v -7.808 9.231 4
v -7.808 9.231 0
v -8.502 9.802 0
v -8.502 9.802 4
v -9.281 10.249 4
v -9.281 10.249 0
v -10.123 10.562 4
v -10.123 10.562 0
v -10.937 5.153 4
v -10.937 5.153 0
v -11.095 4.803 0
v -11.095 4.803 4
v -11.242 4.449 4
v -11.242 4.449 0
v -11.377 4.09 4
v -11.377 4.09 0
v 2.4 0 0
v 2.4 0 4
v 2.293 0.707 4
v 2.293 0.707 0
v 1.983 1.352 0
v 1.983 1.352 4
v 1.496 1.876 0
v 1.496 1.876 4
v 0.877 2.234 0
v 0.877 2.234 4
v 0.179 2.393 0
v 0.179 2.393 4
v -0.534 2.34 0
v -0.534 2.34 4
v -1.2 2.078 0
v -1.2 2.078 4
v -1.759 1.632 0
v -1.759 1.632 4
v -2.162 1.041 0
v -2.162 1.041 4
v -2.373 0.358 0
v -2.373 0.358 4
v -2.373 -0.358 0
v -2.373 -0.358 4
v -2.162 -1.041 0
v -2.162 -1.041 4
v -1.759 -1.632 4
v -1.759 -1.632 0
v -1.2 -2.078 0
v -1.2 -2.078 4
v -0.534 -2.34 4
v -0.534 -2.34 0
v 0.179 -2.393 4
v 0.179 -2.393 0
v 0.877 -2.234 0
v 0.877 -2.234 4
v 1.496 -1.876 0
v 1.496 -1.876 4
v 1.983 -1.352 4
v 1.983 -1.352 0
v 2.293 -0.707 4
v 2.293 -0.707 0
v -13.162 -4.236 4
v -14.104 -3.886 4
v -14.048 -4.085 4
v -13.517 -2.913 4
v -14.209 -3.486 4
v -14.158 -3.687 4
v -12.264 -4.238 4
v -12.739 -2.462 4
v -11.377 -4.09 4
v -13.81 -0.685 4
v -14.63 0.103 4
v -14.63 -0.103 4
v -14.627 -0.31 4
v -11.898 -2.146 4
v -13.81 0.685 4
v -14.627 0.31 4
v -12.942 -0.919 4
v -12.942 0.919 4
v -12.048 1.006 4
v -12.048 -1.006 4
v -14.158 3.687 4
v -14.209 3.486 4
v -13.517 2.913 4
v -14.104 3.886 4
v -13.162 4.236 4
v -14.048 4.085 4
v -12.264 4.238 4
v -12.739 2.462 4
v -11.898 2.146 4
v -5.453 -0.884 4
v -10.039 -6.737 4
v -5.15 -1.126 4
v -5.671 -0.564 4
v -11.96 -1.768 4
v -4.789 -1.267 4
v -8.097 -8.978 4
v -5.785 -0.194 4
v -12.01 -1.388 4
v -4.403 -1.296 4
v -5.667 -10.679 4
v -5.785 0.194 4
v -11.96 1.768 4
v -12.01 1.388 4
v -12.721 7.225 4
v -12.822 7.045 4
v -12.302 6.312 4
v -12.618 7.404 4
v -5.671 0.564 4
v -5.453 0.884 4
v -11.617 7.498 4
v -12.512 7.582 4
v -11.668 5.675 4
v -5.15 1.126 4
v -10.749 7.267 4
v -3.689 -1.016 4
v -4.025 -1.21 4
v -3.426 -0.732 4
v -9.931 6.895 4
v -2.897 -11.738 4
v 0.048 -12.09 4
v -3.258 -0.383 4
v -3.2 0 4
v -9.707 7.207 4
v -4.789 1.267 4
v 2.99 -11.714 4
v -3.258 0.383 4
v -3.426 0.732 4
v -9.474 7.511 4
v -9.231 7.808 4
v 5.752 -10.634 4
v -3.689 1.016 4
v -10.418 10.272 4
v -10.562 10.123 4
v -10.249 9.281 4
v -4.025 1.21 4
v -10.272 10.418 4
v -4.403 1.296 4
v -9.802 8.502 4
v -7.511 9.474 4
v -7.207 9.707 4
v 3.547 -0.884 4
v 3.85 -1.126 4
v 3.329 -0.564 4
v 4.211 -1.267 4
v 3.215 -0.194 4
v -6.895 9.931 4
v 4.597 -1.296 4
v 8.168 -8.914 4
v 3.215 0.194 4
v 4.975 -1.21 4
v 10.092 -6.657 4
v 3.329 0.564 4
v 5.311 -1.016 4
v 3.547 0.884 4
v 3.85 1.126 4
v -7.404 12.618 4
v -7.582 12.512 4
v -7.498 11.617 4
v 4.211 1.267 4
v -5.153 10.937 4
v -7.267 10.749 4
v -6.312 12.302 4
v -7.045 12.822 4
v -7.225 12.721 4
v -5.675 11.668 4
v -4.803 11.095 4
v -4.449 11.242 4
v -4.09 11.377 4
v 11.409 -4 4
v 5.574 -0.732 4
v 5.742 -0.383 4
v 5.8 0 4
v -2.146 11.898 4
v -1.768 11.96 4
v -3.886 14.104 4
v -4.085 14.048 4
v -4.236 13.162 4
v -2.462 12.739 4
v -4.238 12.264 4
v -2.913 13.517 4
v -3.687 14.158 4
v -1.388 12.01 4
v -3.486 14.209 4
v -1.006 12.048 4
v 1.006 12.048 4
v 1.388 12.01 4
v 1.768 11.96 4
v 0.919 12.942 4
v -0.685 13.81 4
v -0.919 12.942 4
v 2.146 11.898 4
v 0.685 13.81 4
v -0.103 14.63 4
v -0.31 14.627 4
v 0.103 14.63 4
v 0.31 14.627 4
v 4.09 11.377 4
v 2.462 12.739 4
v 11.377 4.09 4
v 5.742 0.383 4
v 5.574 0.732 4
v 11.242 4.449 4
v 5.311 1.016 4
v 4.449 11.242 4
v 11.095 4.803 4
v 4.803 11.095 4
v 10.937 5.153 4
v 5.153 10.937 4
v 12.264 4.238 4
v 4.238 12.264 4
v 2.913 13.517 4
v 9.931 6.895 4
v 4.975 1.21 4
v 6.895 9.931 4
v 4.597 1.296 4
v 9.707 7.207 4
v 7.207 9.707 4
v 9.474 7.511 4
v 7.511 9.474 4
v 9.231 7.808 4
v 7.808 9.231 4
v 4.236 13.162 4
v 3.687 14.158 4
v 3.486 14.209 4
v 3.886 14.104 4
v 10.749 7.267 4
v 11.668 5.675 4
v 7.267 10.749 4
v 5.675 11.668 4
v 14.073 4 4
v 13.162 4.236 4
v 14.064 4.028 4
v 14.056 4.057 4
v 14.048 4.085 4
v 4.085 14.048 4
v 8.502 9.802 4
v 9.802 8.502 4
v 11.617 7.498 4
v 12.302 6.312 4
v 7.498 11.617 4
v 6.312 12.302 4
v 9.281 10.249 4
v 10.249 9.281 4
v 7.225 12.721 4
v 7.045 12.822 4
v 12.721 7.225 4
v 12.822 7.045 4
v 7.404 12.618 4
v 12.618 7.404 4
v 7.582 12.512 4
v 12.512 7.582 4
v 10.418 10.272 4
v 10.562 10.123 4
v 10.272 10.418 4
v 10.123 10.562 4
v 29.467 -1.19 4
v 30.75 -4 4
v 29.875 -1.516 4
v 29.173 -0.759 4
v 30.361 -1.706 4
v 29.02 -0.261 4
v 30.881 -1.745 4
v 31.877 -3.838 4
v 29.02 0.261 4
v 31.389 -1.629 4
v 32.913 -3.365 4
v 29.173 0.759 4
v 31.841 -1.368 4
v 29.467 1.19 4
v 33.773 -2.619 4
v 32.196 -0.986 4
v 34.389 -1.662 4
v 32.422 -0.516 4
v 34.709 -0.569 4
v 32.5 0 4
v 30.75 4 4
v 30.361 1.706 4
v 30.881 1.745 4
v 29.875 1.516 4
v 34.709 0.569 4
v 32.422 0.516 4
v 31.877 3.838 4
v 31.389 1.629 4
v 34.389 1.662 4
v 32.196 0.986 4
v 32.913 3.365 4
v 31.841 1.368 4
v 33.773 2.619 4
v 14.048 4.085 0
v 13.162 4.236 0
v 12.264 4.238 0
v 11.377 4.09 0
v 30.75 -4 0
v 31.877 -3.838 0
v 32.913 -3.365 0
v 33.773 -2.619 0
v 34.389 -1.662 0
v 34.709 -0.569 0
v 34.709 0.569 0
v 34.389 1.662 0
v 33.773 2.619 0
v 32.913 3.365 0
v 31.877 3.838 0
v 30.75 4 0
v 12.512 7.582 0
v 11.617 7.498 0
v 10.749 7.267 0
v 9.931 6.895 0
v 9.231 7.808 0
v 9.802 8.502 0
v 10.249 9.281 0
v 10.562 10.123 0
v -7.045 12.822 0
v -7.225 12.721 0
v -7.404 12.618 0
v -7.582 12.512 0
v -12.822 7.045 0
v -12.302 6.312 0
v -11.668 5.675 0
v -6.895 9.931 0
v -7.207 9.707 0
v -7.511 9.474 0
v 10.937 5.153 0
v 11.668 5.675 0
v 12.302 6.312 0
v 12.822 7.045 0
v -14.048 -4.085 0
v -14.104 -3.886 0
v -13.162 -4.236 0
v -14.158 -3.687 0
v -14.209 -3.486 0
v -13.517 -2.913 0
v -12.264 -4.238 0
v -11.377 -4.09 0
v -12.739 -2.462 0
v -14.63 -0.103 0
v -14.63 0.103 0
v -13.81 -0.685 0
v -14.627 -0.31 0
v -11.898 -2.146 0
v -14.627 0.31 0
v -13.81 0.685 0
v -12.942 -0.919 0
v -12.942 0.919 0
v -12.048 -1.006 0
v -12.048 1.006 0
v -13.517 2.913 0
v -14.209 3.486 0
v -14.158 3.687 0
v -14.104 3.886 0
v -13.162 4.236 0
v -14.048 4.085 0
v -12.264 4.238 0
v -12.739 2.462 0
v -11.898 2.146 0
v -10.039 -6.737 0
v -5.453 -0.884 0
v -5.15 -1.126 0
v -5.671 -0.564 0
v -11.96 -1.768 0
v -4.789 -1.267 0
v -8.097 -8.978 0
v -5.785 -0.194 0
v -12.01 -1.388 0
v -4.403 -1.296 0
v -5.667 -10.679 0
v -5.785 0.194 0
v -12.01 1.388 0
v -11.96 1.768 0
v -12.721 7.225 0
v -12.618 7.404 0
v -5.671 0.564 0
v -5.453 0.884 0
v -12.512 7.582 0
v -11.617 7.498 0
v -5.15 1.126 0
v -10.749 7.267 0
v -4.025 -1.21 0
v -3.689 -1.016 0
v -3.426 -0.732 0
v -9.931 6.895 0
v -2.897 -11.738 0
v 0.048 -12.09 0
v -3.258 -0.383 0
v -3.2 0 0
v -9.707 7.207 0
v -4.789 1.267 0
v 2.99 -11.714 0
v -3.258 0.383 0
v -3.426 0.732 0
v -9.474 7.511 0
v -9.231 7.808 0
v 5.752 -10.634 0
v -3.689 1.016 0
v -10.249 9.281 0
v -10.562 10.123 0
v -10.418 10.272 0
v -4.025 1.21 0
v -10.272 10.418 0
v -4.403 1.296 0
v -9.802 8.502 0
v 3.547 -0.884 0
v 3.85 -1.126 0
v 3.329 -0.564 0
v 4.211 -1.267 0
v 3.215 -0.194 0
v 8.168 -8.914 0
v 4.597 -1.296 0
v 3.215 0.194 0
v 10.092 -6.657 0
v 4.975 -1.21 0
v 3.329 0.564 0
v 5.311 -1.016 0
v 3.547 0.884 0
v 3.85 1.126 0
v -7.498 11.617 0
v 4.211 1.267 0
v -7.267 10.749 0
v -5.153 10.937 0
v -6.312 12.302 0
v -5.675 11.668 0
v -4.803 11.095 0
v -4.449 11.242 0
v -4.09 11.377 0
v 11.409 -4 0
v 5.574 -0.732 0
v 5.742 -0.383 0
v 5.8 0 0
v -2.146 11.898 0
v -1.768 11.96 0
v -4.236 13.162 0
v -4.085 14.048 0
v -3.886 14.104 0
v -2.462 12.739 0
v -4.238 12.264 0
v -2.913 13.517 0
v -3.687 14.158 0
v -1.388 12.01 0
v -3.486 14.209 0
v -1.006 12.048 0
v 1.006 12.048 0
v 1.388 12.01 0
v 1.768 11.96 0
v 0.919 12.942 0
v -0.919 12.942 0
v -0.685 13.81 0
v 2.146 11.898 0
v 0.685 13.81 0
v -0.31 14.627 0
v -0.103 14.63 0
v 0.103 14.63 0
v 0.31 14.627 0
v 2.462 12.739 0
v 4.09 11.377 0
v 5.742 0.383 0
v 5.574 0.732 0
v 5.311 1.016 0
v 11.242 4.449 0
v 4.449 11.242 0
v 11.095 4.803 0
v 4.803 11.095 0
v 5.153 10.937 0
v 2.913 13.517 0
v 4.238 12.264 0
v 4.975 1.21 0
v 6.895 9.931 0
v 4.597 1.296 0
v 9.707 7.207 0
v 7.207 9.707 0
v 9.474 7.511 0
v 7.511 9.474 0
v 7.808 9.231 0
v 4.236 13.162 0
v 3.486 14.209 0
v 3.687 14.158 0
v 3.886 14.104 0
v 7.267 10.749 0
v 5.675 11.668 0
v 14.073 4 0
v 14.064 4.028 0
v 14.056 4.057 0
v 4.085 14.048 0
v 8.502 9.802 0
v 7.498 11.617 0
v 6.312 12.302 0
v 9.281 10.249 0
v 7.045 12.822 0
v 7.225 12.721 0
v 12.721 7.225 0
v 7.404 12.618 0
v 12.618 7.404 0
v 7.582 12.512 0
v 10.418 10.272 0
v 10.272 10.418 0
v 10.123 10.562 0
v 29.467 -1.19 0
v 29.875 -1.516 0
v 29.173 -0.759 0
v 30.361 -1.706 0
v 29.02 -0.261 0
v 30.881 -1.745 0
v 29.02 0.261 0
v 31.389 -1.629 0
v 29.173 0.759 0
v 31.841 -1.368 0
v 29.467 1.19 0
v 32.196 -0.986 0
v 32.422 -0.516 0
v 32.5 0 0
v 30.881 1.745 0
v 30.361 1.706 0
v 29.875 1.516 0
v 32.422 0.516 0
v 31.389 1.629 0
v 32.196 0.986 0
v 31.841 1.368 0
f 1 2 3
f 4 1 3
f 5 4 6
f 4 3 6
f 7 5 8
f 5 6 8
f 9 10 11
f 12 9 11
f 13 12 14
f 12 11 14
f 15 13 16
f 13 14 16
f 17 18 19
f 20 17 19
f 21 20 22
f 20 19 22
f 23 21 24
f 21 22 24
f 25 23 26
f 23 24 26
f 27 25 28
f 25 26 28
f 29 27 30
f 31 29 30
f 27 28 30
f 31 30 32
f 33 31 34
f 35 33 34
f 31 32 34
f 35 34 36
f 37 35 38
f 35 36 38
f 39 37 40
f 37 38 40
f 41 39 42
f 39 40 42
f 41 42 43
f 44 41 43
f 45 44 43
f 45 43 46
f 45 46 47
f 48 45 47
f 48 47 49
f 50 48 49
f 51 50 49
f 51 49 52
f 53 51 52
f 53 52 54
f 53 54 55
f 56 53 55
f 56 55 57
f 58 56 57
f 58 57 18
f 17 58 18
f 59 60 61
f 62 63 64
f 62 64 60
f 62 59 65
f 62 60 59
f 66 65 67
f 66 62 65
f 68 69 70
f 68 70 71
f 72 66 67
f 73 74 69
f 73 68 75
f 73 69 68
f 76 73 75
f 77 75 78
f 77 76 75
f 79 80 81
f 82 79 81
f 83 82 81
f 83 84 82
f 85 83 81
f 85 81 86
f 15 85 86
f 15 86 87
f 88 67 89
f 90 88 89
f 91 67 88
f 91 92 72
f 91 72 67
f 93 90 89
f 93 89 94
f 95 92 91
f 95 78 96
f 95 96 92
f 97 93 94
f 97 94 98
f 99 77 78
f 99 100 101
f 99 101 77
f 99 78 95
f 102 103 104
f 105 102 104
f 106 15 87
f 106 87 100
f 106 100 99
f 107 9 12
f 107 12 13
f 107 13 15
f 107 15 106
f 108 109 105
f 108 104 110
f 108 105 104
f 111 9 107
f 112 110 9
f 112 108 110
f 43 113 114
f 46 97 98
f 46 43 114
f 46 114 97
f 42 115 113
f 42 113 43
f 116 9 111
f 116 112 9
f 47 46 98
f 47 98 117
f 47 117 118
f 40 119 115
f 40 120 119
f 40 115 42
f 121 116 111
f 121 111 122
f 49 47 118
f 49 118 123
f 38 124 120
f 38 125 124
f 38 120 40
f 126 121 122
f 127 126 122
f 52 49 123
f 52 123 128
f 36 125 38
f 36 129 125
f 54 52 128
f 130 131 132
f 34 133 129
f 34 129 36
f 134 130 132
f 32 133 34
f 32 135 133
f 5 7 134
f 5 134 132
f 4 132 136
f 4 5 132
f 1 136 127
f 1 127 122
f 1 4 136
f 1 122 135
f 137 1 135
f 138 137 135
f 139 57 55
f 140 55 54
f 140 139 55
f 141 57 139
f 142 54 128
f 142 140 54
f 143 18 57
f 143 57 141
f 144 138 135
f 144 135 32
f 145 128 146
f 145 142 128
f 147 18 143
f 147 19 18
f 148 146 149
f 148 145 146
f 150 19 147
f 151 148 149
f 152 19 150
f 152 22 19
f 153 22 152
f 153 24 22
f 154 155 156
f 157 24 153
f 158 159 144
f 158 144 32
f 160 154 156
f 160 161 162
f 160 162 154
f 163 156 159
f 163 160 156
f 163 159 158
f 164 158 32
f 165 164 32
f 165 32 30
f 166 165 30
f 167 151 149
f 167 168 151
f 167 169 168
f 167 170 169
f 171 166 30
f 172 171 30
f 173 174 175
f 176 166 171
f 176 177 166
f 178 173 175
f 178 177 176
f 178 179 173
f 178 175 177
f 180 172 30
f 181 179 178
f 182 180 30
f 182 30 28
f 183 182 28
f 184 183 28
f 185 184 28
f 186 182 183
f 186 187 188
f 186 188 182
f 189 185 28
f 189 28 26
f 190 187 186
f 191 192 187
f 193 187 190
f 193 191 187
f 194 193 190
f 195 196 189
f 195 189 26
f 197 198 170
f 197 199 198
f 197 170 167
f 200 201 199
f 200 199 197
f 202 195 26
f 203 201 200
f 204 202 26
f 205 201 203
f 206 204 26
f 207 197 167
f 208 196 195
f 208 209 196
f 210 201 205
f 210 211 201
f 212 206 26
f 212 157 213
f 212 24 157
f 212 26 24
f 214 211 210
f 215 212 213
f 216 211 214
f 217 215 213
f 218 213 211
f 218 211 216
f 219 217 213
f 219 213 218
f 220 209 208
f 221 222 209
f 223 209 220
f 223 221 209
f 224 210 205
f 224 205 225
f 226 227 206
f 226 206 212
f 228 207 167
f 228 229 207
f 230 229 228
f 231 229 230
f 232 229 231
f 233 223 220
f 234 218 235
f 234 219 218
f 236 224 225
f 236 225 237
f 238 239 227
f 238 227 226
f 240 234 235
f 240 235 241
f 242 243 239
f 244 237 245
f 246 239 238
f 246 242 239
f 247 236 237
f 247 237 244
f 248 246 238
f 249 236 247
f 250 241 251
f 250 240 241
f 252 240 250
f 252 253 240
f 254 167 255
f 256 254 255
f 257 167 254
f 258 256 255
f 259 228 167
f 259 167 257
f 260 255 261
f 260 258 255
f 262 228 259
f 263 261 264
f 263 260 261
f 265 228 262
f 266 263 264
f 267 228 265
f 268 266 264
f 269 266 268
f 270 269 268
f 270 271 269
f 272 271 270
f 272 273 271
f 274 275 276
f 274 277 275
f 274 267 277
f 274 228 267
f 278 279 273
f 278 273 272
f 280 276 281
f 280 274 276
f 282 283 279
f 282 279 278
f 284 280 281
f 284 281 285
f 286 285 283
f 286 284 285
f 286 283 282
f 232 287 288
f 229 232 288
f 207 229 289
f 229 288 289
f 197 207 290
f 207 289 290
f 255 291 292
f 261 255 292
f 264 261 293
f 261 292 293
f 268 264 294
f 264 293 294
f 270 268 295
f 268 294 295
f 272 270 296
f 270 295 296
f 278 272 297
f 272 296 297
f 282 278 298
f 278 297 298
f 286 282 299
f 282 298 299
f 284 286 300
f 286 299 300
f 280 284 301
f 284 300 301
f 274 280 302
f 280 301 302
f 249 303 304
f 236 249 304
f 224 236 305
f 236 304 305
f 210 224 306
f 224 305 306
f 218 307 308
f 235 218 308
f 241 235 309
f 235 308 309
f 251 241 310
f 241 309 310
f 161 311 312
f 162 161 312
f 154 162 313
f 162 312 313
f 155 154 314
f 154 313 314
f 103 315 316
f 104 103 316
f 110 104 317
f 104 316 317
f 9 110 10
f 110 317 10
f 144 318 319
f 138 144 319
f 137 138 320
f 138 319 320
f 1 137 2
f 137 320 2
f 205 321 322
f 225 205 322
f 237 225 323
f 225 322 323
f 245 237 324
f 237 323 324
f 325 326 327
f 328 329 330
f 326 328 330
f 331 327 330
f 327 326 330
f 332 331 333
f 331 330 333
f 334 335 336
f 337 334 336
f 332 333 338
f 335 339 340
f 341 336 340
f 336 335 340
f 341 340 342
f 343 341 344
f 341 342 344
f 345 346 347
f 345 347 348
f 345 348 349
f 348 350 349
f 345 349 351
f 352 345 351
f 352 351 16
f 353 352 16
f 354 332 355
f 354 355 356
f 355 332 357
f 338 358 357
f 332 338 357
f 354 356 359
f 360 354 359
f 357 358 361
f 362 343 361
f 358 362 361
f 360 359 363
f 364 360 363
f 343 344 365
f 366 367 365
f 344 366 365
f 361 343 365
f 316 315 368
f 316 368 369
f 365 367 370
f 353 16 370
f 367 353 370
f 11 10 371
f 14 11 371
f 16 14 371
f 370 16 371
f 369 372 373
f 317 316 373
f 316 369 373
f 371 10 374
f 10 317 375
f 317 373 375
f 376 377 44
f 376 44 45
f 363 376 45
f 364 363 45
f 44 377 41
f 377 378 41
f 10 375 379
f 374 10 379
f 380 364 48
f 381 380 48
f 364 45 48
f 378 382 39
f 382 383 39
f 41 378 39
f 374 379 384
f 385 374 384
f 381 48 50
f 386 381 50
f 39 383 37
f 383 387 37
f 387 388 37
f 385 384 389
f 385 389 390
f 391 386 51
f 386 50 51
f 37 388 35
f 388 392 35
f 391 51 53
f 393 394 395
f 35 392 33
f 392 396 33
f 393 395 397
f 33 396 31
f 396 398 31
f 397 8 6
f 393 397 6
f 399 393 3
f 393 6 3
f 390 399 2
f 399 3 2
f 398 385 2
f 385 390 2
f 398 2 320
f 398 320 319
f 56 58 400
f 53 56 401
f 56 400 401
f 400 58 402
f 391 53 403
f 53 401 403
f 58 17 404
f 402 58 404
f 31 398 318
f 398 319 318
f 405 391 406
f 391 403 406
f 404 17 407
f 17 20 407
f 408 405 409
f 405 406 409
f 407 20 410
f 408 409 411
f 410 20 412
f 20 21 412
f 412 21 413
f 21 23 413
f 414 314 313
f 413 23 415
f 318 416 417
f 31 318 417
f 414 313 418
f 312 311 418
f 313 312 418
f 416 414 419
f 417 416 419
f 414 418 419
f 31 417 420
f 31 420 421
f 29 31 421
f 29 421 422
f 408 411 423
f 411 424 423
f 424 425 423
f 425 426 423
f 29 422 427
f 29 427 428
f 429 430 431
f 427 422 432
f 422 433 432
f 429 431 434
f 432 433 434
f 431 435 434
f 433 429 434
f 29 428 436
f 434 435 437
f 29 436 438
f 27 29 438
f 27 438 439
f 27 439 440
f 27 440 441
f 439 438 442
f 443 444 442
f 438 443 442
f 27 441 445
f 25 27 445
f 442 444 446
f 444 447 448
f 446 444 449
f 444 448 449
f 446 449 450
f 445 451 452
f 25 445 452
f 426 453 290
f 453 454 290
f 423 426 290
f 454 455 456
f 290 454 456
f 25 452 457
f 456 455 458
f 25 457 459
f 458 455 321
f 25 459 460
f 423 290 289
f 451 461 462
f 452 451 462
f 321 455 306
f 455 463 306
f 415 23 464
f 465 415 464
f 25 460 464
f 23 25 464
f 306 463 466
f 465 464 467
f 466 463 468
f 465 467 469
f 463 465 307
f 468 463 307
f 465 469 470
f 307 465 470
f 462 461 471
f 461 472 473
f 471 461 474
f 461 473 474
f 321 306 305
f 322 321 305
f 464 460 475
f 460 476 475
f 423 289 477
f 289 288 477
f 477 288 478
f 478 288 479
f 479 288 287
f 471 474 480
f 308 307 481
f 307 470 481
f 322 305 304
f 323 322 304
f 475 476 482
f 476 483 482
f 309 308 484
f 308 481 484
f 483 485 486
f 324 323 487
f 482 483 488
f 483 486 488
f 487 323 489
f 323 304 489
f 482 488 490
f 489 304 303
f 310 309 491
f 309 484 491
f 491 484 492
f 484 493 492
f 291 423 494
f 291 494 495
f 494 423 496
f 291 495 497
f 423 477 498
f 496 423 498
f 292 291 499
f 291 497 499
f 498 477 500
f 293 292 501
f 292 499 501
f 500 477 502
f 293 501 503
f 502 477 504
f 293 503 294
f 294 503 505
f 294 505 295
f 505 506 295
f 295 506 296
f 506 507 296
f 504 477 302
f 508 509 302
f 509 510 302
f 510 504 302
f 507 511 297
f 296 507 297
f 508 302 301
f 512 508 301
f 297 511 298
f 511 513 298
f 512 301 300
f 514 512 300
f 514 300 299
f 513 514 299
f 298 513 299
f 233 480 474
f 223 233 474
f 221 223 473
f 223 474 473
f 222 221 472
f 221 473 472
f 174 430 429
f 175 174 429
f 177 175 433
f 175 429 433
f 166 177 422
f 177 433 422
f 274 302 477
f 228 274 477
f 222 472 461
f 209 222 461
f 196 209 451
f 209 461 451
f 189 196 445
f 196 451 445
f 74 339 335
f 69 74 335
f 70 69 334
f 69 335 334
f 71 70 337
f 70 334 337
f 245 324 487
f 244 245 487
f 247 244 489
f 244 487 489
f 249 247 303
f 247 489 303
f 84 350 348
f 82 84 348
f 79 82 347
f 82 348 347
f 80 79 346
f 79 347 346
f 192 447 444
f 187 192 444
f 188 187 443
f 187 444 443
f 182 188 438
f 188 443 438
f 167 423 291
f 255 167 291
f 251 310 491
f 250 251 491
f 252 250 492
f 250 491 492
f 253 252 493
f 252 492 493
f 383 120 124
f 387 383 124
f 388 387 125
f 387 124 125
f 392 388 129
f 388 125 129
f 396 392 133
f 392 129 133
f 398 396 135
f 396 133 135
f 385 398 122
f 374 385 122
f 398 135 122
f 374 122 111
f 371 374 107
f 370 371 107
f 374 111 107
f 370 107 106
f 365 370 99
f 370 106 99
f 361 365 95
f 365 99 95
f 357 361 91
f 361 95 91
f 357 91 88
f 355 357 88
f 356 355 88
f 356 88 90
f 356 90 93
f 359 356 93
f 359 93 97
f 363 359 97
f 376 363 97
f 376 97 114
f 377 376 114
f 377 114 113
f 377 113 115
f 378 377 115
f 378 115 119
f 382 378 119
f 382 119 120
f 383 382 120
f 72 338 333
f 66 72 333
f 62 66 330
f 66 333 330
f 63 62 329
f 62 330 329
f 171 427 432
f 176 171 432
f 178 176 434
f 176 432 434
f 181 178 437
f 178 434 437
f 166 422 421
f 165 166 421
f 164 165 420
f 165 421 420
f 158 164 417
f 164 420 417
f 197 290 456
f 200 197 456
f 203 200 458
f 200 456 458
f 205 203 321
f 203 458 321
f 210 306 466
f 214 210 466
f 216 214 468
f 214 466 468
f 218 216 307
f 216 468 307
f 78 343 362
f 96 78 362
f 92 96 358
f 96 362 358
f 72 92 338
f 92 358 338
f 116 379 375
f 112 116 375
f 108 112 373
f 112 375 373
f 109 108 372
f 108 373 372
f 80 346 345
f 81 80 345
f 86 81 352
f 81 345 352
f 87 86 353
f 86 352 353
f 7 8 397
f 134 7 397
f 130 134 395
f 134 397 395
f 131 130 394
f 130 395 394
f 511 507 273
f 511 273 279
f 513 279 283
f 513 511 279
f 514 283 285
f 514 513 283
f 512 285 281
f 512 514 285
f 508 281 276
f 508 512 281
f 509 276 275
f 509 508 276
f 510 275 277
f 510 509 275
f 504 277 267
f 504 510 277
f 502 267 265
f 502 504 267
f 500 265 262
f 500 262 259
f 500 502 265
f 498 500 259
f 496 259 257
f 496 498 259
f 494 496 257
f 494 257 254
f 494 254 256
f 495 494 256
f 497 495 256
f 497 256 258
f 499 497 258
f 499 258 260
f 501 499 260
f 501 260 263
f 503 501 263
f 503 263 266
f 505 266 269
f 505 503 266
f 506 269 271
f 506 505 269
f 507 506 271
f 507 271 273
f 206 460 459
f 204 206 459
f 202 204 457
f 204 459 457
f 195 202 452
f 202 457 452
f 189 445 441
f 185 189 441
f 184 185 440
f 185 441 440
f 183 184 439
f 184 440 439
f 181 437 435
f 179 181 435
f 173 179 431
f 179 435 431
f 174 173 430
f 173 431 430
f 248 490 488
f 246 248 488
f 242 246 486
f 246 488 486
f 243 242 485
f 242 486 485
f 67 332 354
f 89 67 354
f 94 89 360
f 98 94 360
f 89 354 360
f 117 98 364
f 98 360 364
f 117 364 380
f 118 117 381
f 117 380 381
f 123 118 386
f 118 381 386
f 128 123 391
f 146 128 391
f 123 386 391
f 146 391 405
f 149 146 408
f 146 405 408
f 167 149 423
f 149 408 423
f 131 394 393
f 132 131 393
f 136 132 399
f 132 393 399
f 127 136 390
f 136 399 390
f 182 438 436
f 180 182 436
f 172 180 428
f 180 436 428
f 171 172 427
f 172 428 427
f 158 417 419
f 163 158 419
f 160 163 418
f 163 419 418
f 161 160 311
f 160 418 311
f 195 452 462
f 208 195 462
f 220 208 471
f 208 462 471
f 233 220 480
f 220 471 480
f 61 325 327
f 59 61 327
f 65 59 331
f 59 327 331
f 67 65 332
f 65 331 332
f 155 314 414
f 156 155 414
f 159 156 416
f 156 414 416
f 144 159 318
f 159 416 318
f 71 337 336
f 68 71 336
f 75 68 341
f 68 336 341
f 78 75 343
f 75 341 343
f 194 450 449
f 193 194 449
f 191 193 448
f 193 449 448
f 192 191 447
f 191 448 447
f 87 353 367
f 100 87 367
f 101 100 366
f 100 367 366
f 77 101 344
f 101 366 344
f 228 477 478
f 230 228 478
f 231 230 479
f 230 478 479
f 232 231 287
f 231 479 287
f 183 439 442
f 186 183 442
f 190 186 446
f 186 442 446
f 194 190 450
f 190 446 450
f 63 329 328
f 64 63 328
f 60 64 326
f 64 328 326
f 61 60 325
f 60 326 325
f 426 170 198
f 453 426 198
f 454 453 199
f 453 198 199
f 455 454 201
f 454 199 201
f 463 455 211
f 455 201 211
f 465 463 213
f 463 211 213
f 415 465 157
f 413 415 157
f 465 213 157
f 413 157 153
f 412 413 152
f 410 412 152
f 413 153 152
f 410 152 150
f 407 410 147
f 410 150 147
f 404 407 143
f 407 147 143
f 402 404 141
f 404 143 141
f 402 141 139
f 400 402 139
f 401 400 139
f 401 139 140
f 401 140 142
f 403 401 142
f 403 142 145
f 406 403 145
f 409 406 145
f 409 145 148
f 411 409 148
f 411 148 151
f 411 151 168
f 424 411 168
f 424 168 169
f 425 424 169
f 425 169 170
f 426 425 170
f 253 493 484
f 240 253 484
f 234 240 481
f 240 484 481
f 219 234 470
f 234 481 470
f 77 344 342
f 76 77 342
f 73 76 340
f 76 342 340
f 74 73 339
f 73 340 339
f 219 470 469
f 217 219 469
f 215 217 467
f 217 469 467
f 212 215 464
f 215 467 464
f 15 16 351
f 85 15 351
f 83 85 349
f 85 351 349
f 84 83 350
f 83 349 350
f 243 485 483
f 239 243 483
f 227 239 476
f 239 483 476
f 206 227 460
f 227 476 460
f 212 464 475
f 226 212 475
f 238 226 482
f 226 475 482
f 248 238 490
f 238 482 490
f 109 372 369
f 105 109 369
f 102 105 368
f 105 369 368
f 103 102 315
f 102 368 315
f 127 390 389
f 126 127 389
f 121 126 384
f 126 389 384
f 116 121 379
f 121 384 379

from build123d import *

# Parameters (mm, degrees)
SKETCH1_R           = 1.75
BOSS_EXTRUDE1_DEPTH = 4
SKETCH2_R           = 1.3
SKETCH2_R_2         = 2.4
CUT_EXTRUDE1_DEPTH  = 38.915688046


with BuildPart() as part:
    # Sketch1 → Boss-Extrude1 (new body)
    with BuildSketch(Plane.XY):
        with BuildLine():
            ThreePointArc((30.75, -4), (34.75, 0), (30.75, 4))
            Line((30.75, 4), (14.072558403, 4))
            ThreePointArc((14.072558403, 4), (14.06038767, 4.04257326), (14.048088143, 4.085109489))
            ThreePointArc((14.048088143, 4.085109489), (12.712915648, 4.255390909), (11.377106712, 4.090176385))
            ThreePointArc((11.377106712, 4.090176385), (11.169703548, 4.626642697), (10.937020765, 5.152637848))
            ThreePointArc((10.937020765, 5.152637848), (11.998404632, 5.980373095), (12.82210701, 7.044889767))
            ThreePointArc((12.82210701, 7.044889767), (12.669951657, 7.315), (12.51210701, 7.581825517))
            ThreePointArc((12.51210701, 7.581825517), (11.17835734, 7.400736668), (9.930825655, 6.8954189))
            ThreePointArc((9.930825655, 6.8954189), (9.591641884, 7.359925677), (9.230750012, 7.807775241))
            ThreePointArc((9.230750012, 7.807775241), (10.041734454, 8.882012453), (10.561852666, 10.123446462))
            ThreePointArc((10.561852666, 10.123446462), (10.344972209, 10.344972209), (10.123446462, 10.561852666))
            ThreePointArc((10.123446462, 10.561852666), (8.882012453, 10.041734454), (7.807775241, 9.230750012))
            ThreePointArc((7.807775241, 9.230750012), (7.359925677, 9.591641884), (6.8954189, 9.930825655))
            ThreePointArc((6.8954189, 9.930825655), (7.400736668, 11.17835734), (7.581825517, 12.51210701))
            ThreePointArc((7.581825517, 12.51210701), (7.315, 12.669951657), (7.044889767, 12.82210701))
            ThreePointArc((7.044889767, 12.82210701), (5.980373095, 11.998404632), (5.152637848, 10.937020765))
            ThreePointArc((5.152637848, 10.937020765), (4.626642697, 11.169703548), (4.090176385, 11.377106712))
            ThreePointArc((4.090176385, 11.377106712), (4.255390909, 12.712915648), (4.085109489, 14.048088143))
            ThreePointArc((4.085109489, 14.048088143), (3.78652263, 14.131494839), (3.486235477, 14.208555951))
            ThreePointArc((3.486235477, 14.208555951), (2.671181194, 13.137403362), (2.1463567, 11.897951627))
            ThreePointArc((2.1463567, 11.897951627), (1.578061664, 11.986568374), (1.00619511, 12.048056748))
            ThreePointArc((1.00619511, 12.048056748), (0.820047291, 13.381109763), (0.31, 14.626715284))
            ThreePointArc((0.31, 14.626715284), (0, 14.63), (-0.31, 14.626715284))
            ThreePointArc((-0.31, 14.626715284), (-0.820047291, 13.381109763), (-1.00619511, 12.048056748))
            ThreePointArc((-1.00619511, 12.048056748), (-1.578061664, 11.986568374), (-2.1463567, 11.897951627))
            ThreePointArc((-2.1463567, 11.897951627), (-2.671181194, 13.137403362), (-3.486235477, 14.208555951))
            ThreePointArc((-3.486235477, 14.208555951), (-3.78652263, 14.131494839), (-4.085109489, 14.048088143))
            ThreePointArc((-4.085109489, 14.048088143), (-4.255390909, 12.712915648), (-4.090176385, 11.377106712))
            ThreePointArc((-4.090176385, 11.377106712), (-4.626642697, 11.169703548), (-5.152637848, 10.937020765))
            ThreePointArc((-5.152637848, 10.937020765), (-5.980373095, 11.998404632), (-7.044889767, 12.82210701))
            ThreePointArc((-7.044889767, 12.82210701), (-7.315, 12.669951657), (-7.581825517, 12.51210701))
            ThreePointArc((-7.581825517, 12.51210701), (-7.400736668, 11.17835734), (-6.8954189, 9.930825655))
            ThreePointArc((-6.8954189, 9.930825655), (-7.359925677, 9.591641884), (-7.807775241, 9.230750012))
            ThreePointArc((-7.807775241, 9.230750012), (-8.882012453, 10.041734454), (-10.123446462, 10.561852666))
            ThreePointArc((-10.123446462, 10.561852666), (-10.344972209, 10.344972209), (-10.561852666, 10.123446462))
            ThreePointArc((-10.561852666, 10.123446462), (-10.041734454, 8.882012453), (-9.230750012, 7.807775241))
            ThreePointArc((-9.230750012, 7.807775241), (-9.591641884, 7.359925677), (-9.930825655, 6.8954189))
            ThreePointArc((-9.930825655, 6.8954189), (-11.17835734, 7.400736668), (-12.51210701, 7.581825517))
            ThreePointArc((-12.51210701, 7.581825517), (-12.669951657, 7.315), (-12.82210701, 7.044889767))
            ThreePointArc((-12.82210701, 7.044889767), (-11.998404632, 5.980373095), (-10.937020765, 5.152637848))
            ThreePointArc((-10.937020765, 5.152637848), (-11.169703548, 4.626642697), (-11.377106712, 4.090176385))
            ThreePointArc((-11.377106712, 4.090176385), (-12.712915648, 4.255390909), (-14.048088143, 4.085109489))
            ThreePointArc((-14.048088143, 4.085109489), (-14.131494839, 3.78652263), (-14.208555951, 3.486235477))
            ThreePointArc((-14.208555951, 3.486235477), (-13.137403362, 2.671181194), (-11.897951627, 2.1463567))
            ThreePointArc((-11.897951627, 2.1463567), (-11.986568374, 1.578061664), (-12.048056748, 1.00619511))
            ThreePointArc((-12.048056748, 1.00619511), (-13.381109763, 0.820047291), (-14.626715284, 0.31))
            ThreePointArc((-14.626715284, 0.31), (-14.63, 0), (-14.626715284, -0.31))
            ThreePointArc((-14.626715284, -0.31), (-13.381109763, -0.820047291), (-12.048056748, -1.00619511))
            ThreePointArc((-12.048056748, -1.00619511), (-11.986568374, -1.578061664), (-11.897951627, -2.1463567))
            ThreePointArc((-11.897951627, -2.1463567), (-13.137403362, -2.671181194), (-14.208555951, -3.486235477))
            ThreePointArc((-14.208555951, -3.486235477), (-14.131494839, -3.78652263), (-14.048088143, -4.085109489))
            ThreePointArc((-14.048088143, -4.085109489), (-12.712915648, -4.255390909), (-11.377106712, -4.090176385))
            ThreePointArc((-11.377106712, -4.090176385), (0.047845736, -12.089905326), (11.409123542, -4))
            Line((11.409123542, -4), (30.75, -4))
        make_face()
        Circle(SKETCH1_R, mode=Mode.SUBTRACT)
        with Locations((30.75, 0)):
            Circle(SKETCH1_R, mode=Mode.SUBTRACT)
    extrude(amount=BOSS_EXTRUDE1_DEPTH)

    # Sketch2 → Cut-Extrude1 (cut, through all)
    with BuildSketch(Plane.XY.offset(4)):
        with Locations((4.5, 0)):
            Circle(SKETCH2_R)
        with Locations((-4.5, 0)):
            Circle(SKETCH2_R)
        Circle(SKETCH2_R_2)
    extrude(amount=-CUT_EXTRUDE1_DEPTH, mode=Mode.SUBTRACT)


solid = part.part
